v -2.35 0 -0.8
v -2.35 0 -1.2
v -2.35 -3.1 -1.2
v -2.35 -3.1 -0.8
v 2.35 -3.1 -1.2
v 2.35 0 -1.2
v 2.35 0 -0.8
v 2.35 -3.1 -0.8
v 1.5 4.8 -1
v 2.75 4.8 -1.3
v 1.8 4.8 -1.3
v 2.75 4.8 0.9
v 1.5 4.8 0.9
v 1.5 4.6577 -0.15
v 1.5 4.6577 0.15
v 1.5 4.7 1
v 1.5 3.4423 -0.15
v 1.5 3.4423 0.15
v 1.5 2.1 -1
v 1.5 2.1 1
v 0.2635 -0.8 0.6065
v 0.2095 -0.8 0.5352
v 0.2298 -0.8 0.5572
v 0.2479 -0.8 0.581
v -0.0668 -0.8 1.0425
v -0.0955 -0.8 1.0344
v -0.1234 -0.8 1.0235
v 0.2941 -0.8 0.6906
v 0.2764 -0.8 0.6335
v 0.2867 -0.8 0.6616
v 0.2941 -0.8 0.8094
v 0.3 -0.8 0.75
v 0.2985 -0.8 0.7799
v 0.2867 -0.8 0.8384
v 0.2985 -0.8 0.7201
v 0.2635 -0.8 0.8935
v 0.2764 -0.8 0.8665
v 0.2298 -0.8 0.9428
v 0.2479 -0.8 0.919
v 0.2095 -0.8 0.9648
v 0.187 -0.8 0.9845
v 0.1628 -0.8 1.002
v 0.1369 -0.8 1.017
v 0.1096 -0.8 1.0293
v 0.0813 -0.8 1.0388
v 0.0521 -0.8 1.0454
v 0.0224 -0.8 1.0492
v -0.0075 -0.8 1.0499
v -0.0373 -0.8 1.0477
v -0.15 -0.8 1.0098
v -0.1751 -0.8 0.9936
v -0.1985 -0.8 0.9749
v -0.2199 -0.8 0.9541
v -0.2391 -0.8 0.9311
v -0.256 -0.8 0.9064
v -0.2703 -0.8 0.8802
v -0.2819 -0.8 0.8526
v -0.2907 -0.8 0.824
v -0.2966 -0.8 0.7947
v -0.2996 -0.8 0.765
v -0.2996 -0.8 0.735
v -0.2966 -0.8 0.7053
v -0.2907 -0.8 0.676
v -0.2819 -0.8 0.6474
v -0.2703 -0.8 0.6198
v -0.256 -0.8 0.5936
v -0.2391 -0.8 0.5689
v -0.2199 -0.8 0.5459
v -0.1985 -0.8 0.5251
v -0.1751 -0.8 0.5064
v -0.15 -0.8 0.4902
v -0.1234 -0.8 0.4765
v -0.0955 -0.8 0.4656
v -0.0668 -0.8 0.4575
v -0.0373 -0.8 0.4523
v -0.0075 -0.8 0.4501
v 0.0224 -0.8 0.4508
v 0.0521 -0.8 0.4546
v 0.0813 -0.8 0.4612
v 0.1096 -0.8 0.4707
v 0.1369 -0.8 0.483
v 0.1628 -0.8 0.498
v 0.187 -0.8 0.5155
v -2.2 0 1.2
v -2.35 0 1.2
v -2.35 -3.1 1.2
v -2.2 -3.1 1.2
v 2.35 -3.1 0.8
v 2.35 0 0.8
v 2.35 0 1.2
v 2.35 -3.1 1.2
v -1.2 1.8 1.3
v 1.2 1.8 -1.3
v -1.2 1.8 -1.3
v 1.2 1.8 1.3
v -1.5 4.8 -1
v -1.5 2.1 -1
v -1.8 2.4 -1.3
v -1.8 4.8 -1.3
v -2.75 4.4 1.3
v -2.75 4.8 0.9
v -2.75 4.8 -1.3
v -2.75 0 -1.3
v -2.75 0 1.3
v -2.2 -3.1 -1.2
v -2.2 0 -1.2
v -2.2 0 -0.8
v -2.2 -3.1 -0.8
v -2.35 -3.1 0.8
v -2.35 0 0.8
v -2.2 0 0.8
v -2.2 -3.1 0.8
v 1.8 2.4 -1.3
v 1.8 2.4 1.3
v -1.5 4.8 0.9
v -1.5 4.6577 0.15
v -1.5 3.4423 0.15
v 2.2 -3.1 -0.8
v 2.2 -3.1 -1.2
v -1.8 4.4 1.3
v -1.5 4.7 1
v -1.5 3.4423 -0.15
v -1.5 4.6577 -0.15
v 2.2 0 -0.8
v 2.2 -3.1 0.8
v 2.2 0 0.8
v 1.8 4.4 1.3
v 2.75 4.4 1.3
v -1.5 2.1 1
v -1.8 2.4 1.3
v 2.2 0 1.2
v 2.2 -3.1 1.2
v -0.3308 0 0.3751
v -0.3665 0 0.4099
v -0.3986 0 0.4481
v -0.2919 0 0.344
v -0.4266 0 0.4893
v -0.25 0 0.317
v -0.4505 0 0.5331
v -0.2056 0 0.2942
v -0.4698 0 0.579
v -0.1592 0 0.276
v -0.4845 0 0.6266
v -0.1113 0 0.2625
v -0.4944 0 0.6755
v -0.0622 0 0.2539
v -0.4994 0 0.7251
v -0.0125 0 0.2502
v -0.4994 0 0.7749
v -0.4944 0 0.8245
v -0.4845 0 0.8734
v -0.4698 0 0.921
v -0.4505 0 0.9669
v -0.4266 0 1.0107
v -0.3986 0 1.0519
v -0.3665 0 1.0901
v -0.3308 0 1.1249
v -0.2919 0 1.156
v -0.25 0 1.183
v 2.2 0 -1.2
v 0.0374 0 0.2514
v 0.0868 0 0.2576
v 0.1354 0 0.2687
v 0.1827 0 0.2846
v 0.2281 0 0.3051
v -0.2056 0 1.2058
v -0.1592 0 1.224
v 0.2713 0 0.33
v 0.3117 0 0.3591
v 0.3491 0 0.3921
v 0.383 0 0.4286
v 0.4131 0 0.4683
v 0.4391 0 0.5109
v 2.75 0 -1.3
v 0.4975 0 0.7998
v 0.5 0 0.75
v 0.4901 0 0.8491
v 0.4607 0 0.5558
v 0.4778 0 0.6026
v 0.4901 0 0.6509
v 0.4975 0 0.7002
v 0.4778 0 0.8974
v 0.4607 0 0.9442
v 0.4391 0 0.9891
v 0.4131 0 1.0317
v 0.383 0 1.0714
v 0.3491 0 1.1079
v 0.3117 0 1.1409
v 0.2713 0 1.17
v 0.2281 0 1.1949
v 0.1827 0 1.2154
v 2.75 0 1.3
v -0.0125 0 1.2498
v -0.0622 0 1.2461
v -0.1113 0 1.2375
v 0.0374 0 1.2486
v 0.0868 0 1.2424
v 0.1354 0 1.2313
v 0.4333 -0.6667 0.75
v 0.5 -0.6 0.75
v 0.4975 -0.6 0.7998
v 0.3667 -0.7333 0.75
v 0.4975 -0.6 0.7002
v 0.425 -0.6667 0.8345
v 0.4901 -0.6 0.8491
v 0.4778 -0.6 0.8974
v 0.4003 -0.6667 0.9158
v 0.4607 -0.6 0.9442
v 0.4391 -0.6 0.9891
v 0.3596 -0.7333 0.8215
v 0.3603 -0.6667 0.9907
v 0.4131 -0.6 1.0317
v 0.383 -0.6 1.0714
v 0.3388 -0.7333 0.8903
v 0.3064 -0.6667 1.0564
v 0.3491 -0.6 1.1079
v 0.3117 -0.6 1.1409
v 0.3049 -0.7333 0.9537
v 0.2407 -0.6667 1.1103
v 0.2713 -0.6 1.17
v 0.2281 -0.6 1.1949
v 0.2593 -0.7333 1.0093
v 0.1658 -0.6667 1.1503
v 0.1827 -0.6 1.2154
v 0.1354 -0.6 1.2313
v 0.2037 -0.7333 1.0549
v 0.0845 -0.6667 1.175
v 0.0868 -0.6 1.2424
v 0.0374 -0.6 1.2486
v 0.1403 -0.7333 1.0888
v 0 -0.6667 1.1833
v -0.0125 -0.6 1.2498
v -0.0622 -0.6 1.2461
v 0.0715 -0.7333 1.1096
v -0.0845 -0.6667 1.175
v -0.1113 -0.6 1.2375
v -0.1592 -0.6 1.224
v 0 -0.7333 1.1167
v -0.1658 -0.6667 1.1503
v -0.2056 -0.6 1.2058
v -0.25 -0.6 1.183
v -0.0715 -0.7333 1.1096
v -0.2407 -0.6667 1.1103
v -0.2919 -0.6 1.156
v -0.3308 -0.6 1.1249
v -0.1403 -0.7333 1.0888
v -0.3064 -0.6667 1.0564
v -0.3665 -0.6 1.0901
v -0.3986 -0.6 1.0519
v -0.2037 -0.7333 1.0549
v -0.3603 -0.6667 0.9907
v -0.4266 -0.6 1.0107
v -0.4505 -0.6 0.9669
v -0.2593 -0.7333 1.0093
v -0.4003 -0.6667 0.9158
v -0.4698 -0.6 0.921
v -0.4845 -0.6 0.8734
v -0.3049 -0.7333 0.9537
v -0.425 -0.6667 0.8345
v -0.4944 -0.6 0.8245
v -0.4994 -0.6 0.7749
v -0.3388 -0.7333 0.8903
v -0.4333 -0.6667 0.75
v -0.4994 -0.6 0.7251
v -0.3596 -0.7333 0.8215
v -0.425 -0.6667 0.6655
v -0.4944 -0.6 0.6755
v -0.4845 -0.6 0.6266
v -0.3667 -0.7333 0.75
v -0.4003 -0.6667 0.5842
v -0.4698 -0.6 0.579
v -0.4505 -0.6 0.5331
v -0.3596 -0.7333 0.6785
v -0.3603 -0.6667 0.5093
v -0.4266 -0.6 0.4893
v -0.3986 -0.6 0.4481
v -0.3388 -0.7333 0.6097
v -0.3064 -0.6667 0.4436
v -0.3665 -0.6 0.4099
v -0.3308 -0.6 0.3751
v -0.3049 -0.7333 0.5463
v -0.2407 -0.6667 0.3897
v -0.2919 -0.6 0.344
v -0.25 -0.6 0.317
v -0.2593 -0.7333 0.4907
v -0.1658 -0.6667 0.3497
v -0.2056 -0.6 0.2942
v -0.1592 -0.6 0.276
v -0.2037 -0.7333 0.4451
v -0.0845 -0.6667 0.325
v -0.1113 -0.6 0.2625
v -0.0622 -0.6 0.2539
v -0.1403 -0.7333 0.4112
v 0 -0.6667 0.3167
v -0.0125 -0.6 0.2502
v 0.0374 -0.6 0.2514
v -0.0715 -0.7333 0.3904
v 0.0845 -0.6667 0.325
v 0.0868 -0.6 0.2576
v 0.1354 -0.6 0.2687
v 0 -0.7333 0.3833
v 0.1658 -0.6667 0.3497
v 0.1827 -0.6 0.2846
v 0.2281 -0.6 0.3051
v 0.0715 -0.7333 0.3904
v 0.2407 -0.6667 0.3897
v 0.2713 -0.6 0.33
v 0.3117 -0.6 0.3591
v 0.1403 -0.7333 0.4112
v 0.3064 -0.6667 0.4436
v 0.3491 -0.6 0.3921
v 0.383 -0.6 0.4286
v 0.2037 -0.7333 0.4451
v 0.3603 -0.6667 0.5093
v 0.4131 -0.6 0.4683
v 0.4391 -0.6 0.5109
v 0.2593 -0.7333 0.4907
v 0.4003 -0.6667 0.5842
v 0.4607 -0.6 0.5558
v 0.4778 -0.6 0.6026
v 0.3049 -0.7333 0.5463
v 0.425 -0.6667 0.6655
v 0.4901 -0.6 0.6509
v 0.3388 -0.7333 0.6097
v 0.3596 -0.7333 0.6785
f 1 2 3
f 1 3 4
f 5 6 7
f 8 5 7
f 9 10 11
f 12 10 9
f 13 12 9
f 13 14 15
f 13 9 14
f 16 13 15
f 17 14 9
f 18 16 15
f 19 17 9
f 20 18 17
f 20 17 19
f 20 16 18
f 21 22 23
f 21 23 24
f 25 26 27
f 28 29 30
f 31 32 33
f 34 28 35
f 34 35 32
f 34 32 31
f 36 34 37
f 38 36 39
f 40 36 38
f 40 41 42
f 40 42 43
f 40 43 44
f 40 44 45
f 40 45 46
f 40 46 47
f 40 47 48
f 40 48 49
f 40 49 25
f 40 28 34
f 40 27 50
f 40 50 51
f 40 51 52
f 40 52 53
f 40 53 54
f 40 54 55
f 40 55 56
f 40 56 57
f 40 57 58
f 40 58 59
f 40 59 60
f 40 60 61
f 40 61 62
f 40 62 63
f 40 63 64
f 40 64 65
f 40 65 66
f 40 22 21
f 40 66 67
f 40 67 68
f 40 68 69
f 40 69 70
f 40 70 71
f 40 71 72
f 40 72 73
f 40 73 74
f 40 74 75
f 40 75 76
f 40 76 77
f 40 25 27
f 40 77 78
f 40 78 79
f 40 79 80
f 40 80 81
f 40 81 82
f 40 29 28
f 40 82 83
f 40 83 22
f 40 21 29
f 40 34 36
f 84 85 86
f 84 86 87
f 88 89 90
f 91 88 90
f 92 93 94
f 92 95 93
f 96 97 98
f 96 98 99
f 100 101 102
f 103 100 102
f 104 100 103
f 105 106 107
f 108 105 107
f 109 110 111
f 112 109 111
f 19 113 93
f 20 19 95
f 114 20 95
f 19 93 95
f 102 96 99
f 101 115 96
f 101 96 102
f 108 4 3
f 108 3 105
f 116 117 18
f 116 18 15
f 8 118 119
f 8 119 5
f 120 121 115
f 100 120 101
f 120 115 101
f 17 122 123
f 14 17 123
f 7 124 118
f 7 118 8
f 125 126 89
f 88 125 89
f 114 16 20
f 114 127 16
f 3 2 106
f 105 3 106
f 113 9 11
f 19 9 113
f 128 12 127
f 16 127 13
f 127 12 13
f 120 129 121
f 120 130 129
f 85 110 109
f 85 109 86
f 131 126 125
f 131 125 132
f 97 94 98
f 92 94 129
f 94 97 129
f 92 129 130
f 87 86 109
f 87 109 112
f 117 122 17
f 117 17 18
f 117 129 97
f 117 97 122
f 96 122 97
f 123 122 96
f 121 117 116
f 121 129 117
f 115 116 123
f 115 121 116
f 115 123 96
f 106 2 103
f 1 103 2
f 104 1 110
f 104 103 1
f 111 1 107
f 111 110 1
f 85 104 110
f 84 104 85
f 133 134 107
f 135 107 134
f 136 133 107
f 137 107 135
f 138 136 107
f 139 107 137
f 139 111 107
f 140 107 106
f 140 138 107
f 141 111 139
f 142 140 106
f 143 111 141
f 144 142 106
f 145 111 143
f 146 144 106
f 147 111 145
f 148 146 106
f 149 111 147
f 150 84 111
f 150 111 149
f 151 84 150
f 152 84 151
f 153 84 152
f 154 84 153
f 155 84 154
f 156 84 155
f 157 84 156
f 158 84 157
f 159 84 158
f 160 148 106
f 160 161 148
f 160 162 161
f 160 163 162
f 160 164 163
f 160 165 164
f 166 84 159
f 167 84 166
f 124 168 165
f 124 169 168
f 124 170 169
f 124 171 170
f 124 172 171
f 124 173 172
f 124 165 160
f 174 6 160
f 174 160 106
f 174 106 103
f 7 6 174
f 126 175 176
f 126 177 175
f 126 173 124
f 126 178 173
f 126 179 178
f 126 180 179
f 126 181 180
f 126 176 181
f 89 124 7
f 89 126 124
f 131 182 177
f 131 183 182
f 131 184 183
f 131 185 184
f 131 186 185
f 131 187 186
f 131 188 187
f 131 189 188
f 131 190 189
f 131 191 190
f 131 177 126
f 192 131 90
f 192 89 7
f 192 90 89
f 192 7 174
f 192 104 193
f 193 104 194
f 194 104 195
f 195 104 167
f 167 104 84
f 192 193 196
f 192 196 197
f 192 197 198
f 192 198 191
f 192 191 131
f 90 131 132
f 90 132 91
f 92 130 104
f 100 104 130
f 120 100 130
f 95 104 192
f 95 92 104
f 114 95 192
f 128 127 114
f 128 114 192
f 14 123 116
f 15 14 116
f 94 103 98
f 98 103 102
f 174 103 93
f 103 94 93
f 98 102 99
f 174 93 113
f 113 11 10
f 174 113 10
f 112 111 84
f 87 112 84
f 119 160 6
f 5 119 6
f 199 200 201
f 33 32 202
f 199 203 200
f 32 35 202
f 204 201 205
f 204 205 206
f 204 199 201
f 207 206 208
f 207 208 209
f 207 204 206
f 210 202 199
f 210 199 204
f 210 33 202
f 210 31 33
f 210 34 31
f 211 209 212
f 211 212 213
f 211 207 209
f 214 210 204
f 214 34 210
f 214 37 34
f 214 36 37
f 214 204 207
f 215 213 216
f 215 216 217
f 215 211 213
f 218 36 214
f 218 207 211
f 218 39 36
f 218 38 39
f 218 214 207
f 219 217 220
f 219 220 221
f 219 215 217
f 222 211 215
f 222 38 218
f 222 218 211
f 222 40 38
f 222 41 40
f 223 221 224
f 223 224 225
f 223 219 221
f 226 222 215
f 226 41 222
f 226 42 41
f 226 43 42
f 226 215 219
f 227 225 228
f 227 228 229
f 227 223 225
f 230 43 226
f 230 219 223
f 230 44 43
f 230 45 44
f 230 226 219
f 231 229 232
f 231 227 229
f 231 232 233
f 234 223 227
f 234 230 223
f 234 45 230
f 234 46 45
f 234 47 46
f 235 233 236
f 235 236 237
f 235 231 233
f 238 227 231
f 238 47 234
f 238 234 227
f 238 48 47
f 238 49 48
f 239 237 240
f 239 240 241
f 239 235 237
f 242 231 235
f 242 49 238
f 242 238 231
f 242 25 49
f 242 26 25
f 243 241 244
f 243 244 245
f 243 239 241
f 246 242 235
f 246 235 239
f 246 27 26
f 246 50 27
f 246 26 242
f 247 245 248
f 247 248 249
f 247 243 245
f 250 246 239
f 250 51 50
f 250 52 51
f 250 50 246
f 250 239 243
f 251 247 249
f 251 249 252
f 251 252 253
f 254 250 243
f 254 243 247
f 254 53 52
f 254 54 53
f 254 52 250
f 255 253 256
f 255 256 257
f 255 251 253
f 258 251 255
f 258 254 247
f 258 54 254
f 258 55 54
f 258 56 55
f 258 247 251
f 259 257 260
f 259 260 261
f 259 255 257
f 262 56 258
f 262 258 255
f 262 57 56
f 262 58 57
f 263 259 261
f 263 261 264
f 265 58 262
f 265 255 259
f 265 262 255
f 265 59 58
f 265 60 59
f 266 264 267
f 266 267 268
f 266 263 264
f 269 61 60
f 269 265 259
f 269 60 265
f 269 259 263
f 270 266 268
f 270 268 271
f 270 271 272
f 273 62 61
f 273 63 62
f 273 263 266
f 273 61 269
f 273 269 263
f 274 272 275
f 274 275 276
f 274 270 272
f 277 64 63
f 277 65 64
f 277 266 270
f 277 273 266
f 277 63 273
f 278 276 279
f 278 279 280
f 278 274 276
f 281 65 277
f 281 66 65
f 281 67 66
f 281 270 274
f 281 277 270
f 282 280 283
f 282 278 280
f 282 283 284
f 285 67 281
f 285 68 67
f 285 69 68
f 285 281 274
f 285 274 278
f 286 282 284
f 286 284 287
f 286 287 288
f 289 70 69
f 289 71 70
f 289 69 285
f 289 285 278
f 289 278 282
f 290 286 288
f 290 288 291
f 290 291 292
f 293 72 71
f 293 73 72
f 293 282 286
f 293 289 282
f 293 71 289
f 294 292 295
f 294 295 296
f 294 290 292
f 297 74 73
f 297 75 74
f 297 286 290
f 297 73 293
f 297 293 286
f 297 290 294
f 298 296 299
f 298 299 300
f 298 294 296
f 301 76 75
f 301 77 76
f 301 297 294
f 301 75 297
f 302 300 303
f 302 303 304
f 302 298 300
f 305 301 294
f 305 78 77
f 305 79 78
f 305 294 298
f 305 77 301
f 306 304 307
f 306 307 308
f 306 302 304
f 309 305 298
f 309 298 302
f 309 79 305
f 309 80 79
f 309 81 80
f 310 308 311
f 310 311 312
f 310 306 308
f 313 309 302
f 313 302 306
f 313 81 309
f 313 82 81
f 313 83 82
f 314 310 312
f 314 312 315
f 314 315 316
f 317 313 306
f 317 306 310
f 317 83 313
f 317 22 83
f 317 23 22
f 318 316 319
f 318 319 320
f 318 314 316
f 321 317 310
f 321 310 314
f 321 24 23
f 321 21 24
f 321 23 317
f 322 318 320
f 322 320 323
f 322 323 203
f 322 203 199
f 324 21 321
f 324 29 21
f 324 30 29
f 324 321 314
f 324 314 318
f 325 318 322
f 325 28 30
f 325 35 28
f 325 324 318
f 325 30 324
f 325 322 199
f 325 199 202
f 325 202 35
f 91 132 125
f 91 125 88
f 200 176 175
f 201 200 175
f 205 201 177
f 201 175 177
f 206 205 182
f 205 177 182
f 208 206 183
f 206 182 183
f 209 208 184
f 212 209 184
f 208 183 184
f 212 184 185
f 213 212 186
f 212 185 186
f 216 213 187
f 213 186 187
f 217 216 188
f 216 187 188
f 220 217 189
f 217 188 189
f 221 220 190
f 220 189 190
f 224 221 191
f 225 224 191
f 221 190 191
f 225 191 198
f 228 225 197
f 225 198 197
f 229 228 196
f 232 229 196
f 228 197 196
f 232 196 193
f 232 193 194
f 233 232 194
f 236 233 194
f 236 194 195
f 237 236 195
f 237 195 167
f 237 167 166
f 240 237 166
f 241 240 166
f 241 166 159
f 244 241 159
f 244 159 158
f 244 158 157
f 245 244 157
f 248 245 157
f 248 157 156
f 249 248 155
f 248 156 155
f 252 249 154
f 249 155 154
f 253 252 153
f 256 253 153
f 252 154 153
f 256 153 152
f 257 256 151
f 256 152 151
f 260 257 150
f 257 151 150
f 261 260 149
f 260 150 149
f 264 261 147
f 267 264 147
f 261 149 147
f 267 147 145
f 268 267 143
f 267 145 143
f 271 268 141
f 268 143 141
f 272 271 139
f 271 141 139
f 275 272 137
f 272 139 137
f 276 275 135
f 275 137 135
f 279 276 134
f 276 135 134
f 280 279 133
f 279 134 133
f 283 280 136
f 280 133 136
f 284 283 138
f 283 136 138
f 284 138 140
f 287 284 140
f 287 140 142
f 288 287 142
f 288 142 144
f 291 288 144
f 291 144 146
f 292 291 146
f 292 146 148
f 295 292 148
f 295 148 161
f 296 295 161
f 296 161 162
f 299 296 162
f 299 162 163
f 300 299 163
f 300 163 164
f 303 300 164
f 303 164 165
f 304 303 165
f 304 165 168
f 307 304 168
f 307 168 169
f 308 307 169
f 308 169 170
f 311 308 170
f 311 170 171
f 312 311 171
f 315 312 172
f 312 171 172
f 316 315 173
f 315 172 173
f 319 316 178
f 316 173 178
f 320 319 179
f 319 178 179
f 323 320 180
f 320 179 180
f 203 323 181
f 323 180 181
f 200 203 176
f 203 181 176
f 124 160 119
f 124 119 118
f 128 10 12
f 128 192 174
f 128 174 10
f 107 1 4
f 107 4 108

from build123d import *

# Parameters (mm, degrees)
PAD003_DEPTH    = 1.3
SKETCH008_R     = 0.5
PAD004_DEPTH    = 0.8
SKETCH009_W     = 1.21537
SKETCH009_H     = 0.3
PAD005_DEPTH    = 3
CHAMFER001_SIZE = 0.3
CHAMFER002_SIZE = 0.3
CHAMFER003_SIZE = 0.2
CHAMFER004_SIZE = 0.4
SKETCH010_W     = 0.15
SKETCH010_H     = 0.4
PAD006_DEPTH    = 3.1


with BuildPart() as part:
    # Sketch007 → Pad003 (new body, symmetric)
    with BuildSketch(Plane.XY):
        Polygon((-2.75, 0), (2.75, 0), (2.75, 4.8), (1.5, 4.8), (1.5, 1.8), (-1.5, 1.8), (-1.5, 4.8), (-2.75, 4.8), align=None)
    extrude(amount=PAD003_DEPTH, both=True)

    # Sketch008 (on Face1 of Pad003) → Pad004 (join)
    with BuildSketch(Plane.XZ):
        with Locations((0, 0.75)):
            Circle(SKETCH008_R)
    extrude(amount=PAD004_DEPTH)

    # Sketch009 (on Face11 of Pad004) → Pad005 (join)
    with BuildSketch(Plane.YZ.offset(-1.5)):
        with Locations((4.05, 0)):
            Rectangle(SKETCH009_W, SKETCH009_H)
    extrude(amount=PAD005_DEPTH)

    # Chamfer001
    chamfer001_edges = [part.edges().sort_by_distance(p)[0] for p in [
        (-1.5, 1.8, 0),
        (1.5, 1.8, 0),
    ]]
    chamfer(chamfer001_edges, length=CHAMFER001_SIZE)

    # Chamfer002
    chamfer002_edges = [part.edges().sort_by_distance(p)[0] for p in [
        (-1.5, 3.45, 1.3),
        (-1.5, 3.45, -1.3),
        (1.5, 3.45, 1.3),
        (1.5, 3.45, -1.3),
    ]]
    chamfer(chamfer002_edges, length=CHAMFER002_SIZE)

    # Chamfer003
    chamfer003_edges = [part.edges().sort_by_distance(p)[0] for p in [
        (-0.5, -0.8, 0.75),
    ]]
    chamfer(chamfer003_edges, length=CHAMFER003_SIZE)

    # Chamfer004
    chamfer004_edges = [part.edges().sort_by_distance(p)[0] for p in [
        (2.275, 4.8, 1.3),
        (-2.275, 4.8, 1.3),
    ]]
    chamfer(chamfer004_edges, length=CHAMFER004_SIZE)

    # Sketch010 (on Face6 of Chamfer004) → Pad006 (join)
    with BuildSketch(Plane.XZ):
        with Locations((-2.275, 1)):
            Rectangle(SKETCH010_W, SKETCH010_H)
        with Locations((-2.275, -1)):
            Rectangle(SKETCH010_W, SKETCH010_H)
        with Locations((2.275, 1)):
            Rectangle(SKETCH010_W, SKETCH010_H)
        with Locations((2.275, -1)):
            Rectangle(SKETCH010_W, SKETCH010_H)
    extrude(amount=PAD006_DEPTH)


solid = part.part
